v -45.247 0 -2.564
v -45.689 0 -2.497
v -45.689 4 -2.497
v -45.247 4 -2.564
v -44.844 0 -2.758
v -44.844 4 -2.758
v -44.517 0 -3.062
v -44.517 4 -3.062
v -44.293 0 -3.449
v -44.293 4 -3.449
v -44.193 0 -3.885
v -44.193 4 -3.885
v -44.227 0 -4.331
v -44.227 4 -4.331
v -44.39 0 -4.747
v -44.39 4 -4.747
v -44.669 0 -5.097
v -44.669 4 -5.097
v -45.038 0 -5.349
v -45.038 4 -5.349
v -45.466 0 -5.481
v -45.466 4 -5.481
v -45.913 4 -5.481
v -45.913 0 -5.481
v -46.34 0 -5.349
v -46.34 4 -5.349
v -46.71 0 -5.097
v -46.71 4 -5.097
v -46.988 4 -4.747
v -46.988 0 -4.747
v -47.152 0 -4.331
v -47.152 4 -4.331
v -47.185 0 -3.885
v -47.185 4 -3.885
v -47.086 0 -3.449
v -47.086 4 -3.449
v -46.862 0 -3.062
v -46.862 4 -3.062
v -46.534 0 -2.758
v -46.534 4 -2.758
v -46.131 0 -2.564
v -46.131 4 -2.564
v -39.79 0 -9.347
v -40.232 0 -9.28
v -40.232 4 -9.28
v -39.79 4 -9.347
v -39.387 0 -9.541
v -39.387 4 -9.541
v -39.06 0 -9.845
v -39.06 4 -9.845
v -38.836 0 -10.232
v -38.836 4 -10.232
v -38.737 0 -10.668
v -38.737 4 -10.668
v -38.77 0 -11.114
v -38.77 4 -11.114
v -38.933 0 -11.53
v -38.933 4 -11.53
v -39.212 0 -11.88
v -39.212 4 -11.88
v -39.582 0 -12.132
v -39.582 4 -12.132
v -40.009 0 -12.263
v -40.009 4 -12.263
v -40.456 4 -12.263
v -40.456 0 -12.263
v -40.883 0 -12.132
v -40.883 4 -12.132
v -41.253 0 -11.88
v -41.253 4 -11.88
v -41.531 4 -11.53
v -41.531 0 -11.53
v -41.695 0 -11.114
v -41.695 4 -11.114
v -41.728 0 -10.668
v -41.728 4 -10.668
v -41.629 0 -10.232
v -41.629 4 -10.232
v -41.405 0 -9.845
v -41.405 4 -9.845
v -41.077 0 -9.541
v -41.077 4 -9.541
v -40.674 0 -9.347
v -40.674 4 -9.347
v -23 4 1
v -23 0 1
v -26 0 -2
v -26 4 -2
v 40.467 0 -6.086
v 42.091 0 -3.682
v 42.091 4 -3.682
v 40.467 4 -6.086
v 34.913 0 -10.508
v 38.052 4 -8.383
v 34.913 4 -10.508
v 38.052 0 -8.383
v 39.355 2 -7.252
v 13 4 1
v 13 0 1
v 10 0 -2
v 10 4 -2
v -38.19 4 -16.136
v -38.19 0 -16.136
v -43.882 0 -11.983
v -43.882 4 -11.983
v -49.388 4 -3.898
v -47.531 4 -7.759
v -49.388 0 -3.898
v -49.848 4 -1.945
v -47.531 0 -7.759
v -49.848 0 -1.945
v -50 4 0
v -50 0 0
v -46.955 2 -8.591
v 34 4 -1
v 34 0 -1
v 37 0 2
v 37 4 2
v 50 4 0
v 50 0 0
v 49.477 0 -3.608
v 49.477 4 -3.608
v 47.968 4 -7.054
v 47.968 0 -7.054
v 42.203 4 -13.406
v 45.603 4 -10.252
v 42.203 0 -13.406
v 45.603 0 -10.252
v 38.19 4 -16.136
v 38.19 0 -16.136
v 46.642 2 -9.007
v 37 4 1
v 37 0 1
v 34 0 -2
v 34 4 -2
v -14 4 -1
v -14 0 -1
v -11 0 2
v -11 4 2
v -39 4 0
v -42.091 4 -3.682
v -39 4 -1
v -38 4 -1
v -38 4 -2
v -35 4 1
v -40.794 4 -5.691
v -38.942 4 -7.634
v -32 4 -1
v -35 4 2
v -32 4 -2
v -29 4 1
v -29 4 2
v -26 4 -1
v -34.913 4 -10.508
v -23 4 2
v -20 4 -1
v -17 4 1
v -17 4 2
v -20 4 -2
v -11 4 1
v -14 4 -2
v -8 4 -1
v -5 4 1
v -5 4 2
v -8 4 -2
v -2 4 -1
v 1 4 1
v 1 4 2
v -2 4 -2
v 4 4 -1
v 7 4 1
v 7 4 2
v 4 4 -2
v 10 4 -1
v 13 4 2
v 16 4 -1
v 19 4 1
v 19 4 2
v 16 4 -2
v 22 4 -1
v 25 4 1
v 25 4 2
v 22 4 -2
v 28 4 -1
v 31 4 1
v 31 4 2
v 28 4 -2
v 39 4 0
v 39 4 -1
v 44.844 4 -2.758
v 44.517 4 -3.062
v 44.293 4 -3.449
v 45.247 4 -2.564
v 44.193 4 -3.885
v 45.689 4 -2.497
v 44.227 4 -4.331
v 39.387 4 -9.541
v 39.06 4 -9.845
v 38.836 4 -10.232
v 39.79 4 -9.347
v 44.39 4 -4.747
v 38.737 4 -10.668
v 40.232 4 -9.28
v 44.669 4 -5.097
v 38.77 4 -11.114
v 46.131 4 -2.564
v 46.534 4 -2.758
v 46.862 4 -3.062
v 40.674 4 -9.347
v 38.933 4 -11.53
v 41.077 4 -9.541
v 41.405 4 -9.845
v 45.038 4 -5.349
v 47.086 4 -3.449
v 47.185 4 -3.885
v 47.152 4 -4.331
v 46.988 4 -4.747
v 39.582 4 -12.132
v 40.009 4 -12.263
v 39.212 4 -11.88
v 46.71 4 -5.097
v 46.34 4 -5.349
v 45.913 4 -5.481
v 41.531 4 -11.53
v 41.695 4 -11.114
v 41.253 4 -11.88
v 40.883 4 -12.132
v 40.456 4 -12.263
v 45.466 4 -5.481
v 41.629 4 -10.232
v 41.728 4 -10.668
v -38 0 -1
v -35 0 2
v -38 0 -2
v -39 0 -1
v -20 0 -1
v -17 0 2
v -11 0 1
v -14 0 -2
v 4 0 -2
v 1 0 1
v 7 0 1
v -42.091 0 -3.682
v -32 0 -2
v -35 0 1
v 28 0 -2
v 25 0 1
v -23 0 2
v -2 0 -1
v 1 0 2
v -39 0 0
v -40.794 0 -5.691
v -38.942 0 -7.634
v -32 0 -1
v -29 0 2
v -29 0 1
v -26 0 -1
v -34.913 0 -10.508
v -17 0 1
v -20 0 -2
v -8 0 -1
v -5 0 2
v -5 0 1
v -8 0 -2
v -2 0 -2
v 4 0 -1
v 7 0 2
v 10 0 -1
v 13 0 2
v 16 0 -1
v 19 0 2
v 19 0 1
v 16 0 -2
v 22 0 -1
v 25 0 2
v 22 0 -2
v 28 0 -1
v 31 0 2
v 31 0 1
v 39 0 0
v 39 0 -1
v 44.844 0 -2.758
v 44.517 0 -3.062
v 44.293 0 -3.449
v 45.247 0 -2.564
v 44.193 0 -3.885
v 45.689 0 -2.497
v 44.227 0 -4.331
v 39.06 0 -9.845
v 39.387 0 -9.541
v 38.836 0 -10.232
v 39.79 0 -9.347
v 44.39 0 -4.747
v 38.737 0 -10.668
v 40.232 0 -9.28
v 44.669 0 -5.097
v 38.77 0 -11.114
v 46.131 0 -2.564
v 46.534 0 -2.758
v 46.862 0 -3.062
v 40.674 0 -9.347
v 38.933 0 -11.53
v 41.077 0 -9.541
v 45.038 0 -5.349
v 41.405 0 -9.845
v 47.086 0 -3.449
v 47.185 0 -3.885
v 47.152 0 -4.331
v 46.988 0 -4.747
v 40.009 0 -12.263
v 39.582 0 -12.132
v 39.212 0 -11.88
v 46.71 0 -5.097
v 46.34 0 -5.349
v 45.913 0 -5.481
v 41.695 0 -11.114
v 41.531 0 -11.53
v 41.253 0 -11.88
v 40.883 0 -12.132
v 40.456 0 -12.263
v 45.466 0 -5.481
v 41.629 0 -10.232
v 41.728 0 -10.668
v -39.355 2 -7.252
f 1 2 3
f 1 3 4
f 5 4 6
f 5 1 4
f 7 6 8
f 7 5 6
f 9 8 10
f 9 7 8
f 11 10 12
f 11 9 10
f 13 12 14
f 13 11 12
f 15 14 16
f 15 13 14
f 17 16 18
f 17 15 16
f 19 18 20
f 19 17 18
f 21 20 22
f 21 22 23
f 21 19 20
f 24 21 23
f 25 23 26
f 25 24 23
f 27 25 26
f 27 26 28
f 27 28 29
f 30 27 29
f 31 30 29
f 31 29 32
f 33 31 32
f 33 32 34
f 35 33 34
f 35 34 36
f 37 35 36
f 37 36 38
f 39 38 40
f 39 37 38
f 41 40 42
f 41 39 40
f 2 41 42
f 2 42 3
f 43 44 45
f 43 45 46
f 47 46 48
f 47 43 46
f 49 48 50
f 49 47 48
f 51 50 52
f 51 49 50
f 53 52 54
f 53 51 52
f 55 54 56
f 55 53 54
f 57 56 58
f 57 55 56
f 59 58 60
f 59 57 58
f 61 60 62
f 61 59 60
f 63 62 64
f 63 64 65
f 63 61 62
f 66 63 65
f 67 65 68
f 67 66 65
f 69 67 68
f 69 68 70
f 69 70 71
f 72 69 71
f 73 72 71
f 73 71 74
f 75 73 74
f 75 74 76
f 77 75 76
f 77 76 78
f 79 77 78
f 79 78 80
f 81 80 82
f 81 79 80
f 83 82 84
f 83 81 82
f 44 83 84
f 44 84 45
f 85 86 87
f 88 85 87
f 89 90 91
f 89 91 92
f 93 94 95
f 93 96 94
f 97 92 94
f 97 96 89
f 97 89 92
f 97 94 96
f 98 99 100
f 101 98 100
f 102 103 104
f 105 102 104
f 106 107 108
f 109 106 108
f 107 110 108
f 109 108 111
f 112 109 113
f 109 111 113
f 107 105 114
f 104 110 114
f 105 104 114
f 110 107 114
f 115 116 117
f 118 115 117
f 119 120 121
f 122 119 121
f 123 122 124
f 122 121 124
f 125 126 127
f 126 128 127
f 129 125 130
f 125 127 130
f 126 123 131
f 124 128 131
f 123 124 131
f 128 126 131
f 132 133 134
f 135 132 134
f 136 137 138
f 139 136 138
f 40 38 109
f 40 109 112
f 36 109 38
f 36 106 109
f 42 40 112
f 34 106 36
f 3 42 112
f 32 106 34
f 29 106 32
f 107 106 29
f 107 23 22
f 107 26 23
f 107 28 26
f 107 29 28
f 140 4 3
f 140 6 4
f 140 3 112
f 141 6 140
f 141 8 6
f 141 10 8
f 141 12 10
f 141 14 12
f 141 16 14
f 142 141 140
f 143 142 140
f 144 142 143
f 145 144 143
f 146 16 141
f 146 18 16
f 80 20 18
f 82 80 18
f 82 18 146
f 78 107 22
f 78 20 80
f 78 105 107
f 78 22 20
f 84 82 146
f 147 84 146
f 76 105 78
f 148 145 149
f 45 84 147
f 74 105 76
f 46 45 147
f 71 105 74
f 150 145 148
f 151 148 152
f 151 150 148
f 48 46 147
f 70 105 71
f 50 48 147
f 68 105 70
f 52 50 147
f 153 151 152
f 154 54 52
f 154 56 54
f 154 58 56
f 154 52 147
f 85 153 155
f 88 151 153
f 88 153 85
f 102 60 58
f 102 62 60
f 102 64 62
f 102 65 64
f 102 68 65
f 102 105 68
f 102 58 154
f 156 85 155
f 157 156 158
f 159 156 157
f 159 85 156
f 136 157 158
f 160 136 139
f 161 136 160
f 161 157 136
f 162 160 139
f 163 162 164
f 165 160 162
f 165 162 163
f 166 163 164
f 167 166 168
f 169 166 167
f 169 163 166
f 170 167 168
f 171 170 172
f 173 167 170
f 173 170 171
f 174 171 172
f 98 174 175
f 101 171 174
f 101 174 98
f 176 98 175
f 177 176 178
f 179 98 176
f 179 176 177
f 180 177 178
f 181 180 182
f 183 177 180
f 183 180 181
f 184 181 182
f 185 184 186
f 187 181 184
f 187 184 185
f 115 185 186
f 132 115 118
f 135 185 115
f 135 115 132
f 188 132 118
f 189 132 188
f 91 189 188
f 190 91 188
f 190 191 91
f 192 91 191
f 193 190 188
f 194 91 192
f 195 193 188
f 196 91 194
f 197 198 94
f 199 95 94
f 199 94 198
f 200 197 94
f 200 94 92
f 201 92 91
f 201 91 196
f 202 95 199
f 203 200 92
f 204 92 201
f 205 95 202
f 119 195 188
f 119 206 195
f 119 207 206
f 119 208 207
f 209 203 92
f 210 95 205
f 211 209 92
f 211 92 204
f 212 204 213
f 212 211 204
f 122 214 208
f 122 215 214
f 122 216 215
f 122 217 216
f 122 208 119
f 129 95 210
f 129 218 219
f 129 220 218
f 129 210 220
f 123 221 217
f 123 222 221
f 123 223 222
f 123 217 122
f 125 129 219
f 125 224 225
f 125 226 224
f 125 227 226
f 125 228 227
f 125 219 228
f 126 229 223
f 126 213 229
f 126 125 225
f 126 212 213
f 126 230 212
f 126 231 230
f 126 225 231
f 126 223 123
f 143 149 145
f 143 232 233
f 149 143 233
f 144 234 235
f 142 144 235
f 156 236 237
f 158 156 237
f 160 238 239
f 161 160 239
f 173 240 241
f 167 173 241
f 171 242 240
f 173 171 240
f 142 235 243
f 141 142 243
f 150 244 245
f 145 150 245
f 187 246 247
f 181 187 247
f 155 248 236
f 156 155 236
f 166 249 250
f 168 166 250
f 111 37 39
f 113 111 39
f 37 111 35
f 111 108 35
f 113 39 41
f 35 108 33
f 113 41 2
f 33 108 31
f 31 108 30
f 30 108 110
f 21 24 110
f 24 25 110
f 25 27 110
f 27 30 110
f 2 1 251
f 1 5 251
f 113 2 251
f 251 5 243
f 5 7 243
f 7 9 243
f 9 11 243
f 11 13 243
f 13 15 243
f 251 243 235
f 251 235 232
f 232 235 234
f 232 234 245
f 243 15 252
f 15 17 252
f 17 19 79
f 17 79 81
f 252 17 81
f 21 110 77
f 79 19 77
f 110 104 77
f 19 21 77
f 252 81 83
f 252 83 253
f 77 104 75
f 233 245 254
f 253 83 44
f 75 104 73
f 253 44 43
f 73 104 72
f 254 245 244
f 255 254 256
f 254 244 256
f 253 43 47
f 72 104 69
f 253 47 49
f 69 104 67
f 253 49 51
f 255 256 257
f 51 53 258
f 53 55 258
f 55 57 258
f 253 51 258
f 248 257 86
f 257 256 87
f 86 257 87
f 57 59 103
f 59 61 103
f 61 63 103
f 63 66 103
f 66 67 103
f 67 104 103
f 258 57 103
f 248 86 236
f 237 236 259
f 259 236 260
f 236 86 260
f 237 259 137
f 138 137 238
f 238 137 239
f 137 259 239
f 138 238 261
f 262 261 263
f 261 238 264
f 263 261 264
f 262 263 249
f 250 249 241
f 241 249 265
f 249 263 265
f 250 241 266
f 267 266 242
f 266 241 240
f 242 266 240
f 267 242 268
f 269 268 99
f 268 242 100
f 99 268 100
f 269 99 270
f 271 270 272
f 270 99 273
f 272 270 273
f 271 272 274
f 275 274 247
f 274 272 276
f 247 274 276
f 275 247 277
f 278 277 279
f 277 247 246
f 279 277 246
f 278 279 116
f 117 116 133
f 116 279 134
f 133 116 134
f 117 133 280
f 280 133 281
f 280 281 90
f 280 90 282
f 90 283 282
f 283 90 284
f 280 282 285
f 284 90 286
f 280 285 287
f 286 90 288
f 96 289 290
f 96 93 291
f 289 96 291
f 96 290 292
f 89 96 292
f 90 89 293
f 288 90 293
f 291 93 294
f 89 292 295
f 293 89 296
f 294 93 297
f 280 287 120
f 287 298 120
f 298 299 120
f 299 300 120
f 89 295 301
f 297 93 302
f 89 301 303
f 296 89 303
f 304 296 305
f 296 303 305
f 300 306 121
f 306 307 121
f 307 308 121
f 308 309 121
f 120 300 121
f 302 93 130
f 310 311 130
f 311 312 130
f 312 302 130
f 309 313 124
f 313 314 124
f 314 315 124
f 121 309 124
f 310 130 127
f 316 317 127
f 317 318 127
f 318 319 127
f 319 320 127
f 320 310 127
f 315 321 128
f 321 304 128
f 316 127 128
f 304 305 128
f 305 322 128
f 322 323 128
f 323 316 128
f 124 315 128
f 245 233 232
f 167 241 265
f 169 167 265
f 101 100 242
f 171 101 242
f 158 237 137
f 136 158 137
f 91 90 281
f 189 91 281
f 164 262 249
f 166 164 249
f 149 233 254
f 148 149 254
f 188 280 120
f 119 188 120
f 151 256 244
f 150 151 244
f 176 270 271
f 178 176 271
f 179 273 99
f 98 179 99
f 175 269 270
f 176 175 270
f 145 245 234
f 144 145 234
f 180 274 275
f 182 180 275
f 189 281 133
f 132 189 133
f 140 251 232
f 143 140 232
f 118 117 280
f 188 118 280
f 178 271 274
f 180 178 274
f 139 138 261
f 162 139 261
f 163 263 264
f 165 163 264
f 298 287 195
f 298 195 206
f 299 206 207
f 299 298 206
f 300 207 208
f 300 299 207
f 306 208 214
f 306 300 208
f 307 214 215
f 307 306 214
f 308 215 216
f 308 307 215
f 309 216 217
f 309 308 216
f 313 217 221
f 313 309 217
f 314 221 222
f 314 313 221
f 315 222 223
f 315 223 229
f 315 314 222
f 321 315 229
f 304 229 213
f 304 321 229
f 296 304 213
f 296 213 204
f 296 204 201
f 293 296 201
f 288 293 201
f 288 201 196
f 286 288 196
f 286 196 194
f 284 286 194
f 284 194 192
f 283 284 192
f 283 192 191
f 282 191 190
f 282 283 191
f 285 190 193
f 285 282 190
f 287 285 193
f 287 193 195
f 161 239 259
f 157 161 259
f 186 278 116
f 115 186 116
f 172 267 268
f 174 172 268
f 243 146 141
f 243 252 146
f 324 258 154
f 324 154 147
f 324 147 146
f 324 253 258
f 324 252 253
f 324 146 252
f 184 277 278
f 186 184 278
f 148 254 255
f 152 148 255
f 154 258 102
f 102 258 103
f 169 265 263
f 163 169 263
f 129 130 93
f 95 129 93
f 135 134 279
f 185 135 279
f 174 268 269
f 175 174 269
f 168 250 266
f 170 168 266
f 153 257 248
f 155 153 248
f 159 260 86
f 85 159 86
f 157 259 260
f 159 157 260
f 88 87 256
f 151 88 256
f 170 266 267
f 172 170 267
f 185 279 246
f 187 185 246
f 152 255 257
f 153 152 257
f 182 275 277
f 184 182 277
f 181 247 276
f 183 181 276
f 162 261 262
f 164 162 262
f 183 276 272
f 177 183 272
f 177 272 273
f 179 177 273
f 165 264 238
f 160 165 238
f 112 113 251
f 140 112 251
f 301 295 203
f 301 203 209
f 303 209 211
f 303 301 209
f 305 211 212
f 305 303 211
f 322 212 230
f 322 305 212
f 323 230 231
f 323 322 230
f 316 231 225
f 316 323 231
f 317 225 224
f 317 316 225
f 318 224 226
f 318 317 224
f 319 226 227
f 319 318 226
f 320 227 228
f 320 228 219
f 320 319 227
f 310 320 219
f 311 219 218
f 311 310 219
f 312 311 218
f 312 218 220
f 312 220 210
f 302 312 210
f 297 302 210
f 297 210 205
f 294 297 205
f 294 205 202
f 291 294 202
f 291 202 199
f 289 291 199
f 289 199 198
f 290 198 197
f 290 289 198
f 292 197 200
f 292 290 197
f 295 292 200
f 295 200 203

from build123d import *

# Parameters (mm, degrees)
SKETCH_1_R      = 1.5
EXTRUDE_1_DEPTH = 4


with BuildPart() as part:
    # Эскиз1 → Бобышка-Вытянуть1 (new body)
    with BuildSketch(Plane(origin=(0, 0, 0), x_dir=(1, 0, 0), z_dir=(0, 1, 0))):
        with BuildLine():
            Line((-50, 0), (-43, 0))
            Line((-43, 0), (-39, 0))
            Line((-39, 0), (-38, 1))
            Line((-38, 1), (-35, -2))
            Line((-35, -2), (-33, 0))
            Line((-33, 0), (-32, 1))
            Line((-32, 1), (-29, -2))
            Line((-29, -2), (-27, 0))
            Line((-27, 0), (-26, 1))
            Line((-26, 1), (-23, -2))
            Line((-23, -2), (-21, 0))
            Line((-21, 0), (-20, 1))
            Line((-20, 1), (-17, -2))
            Line((-17, -2), (-15, 0))
            Line((-15, 0), (-14, 1))
            Line((-14, 1), (-11, -2))
            Line((-11, -2), (-9, 0))
            Line((-9, 0), (-8, 1))
            Line((-8, 1), (-5, -2))
            Line((-5, -2), (-3, 0))
            Line((-3, 0), (-2, 1))
            Line((-2, 1), (1, -2))
            Line((1, -2), (3, 0))
            Line((3, 0), (4, 1))
            Line((4, 1), (7, -2))
            Line((7, -2), (9, 0))
            Line((9, 0), (10, 1))
            Line((10, 1), (13, -2))
            Line((13, -2), (15, 0))
            Line((15, 0), (16, 1))
            Line((16, 1), (19, -2))
            Line((19, -2), (21, 0))
            Line((21, 0), (22, 1))
            Line((22, 1), (25, -2))
            Line((25, -2), (27, 0))
            Line((27, 0), (28, 1))
            Line((28, 1), (31, -2))
            Line((31, -2), (33, 0))
            Line((33, 0), (34, 1))
            Line((34, 1), (37, -2))
            Line((37, -2), (39, 0))
            Line((39, 0), (43, 0))
            Line((43, 0), (50, 0))
            add(Edge.make_bspline(
                [(50, 0), (50, 9.148701546), (38.189799805, 16.136443156)],
                knots=[6.270008338, 6.270008338, 6.270008338, 6.984807717, 6.984807717, 6.984807717], degree=2, weights=[0.818101322, 0.849400917, 1]))
            Line((38.189799805, 16.136443156), (34.912704057, 10.507753014))
            add(Edge.make_bspline(
                [(42.090540855, 3.682445167), (40.227847319, 7.413208709), (34.912704057, 10.507753014)],
                knots=[0.206034906, 0.206034906, 0.206034906, 0.623356981, 0.623356981, 0.623356981], degree=2, weights=[1, 0.978309158, 1]))
            Line((42.090540855, 3.682445167), (39, 1))
            Line((39, 1), (37, -1))
            Line((37, -1), (34, 2))
            Line((34, 2), (33, 1))
            Line((33, 1), (31, -1))
            Line((31, -1), (28, 2))
            Line((28, 2), (27, 1))
            Line((27, 1), (25, -1))
            Line((25, -1), (22, 2))
            Line((22, 2), (21, 1))
            Line((21, 1), (19, -1))
            Line((19, -1), (16, 2))
            Line((16, 2), (15, 1))
            Line((15, 1), (13, -1))
            Line((13, -1), (10, 2))
            Line((10, 2), (9, 1))
            Line((9, 1), (7, -1))
            Line((7, -1), (4, 2))
            Line((4, 2), (3, 1))
            Line((3, 1), (1, -1))
            Line((1, -1), (-2, 2))
            Line((-2, 2), (-3, 1))
            Line((-3, 1), (-5, -1))
            Line((-5, -1), (-8, 2))
            Line((-8, 2), (-9, 1))
            Line((-9, 1), (-11, -1))
            Line((-11, -1), (-14, 2))
            Line((-14, 2), (-15, 1))
            Line((-15, 1), (-17, -1))
            Line((-17, -1), (-20, 2))
            Line((-20, 2), (-21, 1))
            Line((-21, 1), (-23, -1))
            Line((-23, -1), (-26, 2))
            Line((-26, 2), (-27, 1))
            Line((-27, 1), (-29, -1))
            Line((-29, -1), (-32, 2))
            Line((-32, 2), (-33, 1))
            Line((-33, 1), (-35, -1))
            Line((-35, -1), (-38, 2))
            Line((-38, 2), (-39, 1))
            Line((-39, 1), (-42.090540855, 3.682445167))
            add(Edge.make_bspline(
                [(-34.912704057, 10.507753014), (-40.227846573, 7.413208572), (-42.090540855, 3.682445167)],
                knots=[5.659828256, 5.659828256, 5.659828256, 6.077150244, 6.077150244, 6.077150244], degree=2, weights=[1, 0.978309167, 1]))
            Line((-34.912704057, 10.507753014), (-38.189799805, 16.136443156))
            add(Edge.make_bspline(
                [(-38.189799805, 16.136443156), (-50, 9.148701546), (-50, 0)],
                knots=[2.439970244, 2.439970244, 2.439970244, 3.141592654, 3.141592654, 3.141592654], degree=2, weights=[1, 0.939094243, 1]))
        make_face()
        with Locations(Location((-45.689262056, 3.997292475, 0), (0, 0, 270))):
            Circle(SKETCH_1_R, mode=Mode.SUBTRACT)
        with Locations(Location((-40.232363482, 10.780229305, 0), (0, 0, 270))):
            Circle(SKETCH_1_R, mode=Mode.SUBTRACT)
        with Locations(Location((45.689262056, 3.997292475, 0), (0, 0, 270))):
            Circle(SKETCH_1_R, mode=Mode.SUBTRACT)
        with Locations(Location((40.232363482, 10.780229305, 0), (0, 0, 270))):
            Circle(SKETCH_1_R, mode=Mode.SUBTRACT)
    extrude(amount=EXTRUDE_1_DEPTH)


solid = part.part
